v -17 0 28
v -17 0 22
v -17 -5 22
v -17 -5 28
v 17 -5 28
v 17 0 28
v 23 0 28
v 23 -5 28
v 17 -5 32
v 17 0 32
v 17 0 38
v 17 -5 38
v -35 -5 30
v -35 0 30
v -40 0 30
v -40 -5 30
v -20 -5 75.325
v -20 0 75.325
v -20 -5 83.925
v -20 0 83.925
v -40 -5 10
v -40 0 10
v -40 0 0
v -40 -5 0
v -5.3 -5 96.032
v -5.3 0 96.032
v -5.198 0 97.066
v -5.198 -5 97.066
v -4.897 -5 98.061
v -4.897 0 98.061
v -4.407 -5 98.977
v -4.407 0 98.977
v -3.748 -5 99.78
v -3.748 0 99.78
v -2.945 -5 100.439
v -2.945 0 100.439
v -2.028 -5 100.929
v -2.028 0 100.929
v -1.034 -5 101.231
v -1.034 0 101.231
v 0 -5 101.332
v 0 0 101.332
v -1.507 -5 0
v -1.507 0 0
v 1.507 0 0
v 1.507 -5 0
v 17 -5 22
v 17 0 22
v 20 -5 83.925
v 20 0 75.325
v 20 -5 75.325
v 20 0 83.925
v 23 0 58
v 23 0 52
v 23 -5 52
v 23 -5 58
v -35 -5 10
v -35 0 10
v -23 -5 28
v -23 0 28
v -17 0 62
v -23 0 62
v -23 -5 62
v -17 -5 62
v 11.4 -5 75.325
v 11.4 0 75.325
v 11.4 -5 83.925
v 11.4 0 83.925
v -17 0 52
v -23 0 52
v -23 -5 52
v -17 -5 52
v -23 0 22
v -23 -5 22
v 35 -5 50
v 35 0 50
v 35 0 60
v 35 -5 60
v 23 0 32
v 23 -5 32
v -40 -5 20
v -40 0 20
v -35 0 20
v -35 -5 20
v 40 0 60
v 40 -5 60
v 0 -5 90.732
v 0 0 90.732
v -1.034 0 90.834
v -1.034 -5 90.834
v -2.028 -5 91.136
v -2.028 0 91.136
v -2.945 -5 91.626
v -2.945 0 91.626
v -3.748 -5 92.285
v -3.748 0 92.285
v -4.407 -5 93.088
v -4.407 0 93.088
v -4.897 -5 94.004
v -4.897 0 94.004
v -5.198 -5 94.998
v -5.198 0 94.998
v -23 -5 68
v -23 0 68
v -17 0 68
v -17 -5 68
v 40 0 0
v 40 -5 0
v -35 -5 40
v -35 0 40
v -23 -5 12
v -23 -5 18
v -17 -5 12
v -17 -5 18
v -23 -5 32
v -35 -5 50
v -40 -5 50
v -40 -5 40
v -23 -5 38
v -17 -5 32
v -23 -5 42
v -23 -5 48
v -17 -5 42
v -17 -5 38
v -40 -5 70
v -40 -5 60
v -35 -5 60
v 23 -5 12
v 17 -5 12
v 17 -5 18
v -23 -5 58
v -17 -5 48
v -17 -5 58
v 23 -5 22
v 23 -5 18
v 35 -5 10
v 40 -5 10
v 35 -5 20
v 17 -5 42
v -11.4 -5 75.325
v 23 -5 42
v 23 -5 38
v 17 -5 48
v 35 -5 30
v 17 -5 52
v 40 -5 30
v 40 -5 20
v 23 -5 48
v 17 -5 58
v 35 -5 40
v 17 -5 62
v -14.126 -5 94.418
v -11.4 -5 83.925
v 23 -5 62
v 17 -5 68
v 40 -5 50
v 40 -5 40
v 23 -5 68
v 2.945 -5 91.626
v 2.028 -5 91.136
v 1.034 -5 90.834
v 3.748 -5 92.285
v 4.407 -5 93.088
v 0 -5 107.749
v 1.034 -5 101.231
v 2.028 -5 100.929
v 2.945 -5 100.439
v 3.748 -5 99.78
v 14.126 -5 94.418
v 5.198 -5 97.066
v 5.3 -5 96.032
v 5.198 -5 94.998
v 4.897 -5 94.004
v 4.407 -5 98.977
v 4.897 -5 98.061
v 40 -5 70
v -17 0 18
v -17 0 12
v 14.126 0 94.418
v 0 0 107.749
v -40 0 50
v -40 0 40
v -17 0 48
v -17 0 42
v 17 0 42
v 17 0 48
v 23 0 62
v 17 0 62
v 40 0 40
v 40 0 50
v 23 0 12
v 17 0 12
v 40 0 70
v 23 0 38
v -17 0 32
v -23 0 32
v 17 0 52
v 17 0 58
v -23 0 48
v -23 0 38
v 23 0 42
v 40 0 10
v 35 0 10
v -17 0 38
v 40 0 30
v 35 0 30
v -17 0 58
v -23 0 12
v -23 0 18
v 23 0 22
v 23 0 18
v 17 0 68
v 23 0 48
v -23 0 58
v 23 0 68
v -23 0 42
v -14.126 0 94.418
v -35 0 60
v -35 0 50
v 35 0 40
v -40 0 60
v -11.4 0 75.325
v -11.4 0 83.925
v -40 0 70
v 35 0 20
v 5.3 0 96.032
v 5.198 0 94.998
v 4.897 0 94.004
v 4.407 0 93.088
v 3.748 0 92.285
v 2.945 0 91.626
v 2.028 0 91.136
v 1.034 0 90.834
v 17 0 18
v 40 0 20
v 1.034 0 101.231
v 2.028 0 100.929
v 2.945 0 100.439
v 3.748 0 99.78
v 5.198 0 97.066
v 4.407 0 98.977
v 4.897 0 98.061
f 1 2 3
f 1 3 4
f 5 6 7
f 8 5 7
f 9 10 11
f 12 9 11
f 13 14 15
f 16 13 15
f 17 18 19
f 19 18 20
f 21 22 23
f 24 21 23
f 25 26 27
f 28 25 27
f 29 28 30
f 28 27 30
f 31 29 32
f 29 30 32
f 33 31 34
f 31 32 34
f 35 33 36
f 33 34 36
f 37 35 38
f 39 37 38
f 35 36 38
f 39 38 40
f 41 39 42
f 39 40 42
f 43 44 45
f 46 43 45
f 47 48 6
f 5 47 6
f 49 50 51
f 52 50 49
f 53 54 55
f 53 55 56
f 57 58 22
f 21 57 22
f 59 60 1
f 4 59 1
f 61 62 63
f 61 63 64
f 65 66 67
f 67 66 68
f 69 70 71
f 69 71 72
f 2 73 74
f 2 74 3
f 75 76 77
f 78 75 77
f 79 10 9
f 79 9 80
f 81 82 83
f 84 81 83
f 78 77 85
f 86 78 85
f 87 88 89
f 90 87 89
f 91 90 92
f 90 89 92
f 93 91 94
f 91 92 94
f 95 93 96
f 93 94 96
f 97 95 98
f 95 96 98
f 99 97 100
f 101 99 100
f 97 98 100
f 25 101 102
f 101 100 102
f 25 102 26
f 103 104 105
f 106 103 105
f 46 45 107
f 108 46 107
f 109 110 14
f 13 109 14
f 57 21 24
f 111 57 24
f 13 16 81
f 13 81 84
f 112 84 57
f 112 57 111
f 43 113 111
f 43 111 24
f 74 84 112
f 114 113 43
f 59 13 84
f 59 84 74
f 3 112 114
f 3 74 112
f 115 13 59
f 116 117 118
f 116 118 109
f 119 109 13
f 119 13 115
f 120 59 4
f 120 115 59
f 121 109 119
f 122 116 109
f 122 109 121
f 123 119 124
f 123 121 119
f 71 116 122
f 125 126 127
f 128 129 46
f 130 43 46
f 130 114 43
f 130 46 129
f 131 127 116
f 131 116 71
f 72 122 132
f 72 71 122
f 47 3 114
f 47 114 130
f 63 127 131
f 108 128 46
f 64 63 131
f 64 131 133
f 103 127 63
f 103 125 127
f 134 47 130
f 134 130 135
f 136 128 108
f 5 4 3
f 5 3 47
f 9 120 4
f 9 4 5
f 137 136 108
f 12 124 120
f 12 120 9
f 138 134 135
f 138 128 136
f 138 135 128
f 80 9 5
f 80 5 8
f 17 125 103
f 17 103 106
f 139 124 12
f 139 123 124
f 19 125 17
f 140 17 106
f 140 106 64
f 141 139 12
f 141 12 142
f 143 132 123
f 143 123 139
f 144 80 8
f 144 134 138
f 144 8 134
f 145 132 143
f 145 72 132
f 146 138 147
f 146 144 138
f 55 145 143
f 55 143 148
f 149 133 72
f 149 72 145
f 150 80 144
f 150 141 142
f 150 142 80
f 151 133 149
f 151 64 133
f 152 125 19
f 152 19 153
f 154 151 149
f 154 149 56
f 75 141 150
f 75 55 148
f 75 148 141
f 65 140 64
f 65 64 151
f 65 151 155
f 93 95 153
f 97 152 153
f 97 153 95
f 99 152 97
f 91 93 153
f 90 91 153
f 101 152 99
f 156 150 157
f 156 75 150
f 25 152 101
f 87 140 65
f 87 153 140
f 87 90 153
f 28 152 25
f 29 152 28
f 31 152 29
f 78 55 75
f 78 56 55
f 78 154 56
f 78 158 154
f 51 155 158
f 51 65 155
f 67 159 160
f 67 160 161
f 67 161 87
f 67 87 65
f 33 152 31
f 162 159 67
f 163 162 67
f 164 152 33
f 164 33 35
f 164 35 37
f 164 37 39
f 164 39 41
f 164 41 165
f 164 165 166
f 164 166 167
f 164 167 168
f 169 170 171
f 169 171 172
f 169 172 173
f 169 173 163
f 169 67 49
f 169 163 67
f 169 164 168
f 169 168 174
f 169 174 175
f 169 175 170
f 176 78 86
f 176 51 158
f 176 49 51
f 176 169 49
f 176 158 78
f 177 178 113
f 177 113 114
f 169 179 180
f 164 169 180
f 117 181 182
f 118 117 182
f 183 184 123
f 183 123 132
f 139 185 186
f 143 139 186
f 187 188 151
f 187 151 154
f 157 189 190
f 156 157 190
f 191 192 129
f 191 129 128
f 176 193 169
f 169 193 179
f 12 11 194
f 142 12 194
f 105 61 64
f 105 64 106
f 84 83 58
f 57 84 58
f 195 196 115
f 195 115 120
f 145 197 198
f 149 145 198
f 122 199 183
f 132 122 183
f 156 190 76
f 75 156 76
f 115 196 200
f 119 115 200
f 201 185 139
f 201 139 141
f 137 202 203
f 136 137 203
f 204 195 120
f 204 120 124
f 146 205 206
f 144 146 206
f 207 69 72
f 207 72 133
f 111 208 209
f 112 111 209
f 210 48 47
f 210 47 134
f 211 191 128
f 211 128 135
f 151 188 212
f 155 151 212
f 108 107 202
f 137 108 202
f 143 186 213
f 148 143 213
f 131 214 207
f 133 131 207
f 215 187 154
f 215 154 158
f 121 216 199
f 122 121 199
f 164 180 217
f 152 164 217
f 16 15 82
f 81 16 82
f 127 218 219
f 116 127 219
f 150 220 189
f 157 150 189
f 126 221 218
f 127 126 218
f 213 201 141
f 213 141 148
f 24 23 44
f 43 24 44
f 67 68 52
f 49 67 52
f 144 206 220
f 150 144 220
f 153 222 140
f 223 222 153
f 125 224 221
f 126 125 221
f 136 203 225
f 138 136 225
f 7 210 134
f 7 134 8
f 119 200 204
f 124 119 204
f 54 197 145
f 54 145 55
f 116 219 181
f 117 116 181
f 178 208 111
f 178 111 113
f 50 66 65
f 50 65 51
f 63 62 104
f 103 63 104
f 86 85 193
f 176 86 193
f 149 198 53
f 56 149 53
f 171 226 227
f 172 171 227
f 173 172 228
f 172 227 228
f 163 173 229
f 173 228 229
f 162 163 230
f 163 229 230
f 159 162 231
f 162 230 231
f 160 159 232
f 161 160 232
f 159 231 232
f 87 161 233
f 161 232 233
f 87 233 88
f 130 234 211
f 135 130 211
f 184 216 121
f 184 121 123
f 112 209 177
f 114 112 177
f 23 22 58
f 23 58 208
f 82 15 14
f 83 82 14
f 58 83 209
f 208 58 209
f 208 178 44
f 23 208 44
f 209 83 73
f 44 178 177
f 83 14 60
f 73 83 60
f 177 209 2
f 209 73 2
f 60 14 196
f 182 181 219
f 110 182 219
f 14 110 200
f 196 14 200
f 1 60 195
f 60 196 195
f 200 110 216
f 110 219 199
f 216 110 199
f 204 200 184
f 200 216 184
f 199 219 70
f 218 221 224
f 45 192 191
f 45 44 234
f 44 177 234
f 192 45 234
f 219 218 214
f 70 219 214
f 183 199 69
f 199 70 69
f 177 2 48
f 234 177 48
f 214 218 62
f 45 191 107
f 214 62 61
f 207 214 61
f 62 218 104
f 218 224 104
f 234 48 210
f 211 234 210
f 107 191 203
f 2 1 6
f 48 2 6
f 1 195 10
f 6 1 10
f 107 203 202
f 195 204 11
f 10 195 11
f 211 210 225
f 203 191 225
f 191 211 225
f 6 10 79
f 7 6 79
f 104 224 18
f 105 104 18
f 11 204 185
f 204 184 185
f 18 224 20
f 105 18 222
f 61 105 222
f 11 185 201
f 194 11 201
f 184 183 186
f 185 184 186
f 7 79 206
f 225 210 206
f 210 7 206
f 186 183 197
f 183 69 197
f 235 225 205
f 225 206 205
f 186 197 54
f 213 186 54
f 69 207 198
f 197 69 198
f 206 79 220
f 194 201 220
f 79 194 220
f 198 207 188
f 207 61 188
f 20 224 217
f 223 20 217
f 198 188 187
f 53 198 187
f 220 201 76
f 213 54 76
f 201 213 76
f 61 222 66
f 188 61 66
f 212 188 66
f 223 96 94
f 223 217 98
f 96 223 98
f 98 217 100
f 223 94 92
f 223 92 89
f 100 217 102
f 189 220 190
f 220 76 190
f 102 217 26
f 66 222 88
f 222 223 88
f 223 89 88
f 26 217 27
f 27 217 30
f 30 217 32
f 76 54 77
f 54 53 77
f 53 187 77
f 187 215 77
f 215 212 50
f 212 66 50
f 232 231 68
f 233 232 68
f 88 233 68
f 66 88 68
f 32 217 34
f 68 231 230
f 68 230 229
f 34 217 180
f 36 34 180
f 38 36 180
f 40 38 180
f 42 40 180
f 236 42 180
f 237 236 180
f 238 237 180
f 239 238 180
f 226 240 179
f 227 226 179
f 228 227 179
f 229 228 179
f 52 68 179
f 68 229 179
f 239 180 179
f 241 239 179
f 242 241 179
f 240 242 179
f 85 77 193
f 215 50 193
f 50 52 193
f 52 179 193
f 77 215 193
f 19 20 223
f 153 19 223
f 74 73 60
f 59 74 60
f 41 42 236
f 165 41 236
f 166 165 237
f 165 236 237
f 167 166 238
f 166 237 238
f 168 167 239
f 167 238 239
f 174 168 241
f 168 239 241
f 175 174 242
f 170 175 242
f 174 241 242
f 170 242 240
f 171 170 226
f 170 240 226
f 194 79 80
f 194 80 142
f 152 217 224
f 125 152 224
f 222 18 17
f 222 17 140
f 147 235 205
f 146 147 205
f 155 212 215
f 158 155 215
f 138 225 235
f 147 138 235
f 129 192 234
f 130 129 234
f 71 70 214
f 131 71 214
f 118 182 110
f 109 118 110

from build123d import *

# Parameters (mm, degrees)
F0_W     = 6
F0_H     = 6
F0_W_2   = 1.507329056
F0_H_2   = 5.8719553053
F0_W_3   = 8.6
F0_H_3   = 8.6
F1_DEPTH = 5


with BuildPart() as f1:
    # F0 (on Front) → F1 (new body)
    with BuildSketch(Plane.XZ):
        Polygon((-40, 10), (-40, 0), (-1.507329056, 0), (-1.507329056, 5.8719553053), (0, 5.8719553053), (0, 70), (-40, 70), (-40, 60), (-35, 60), (-35, 50), (-40, 50), (-40, 40), (-35, 40), (-35, 30), (-40, 30), (-40, 20), (-35, 20), (-35, 10), align=None)
        with Locations((-20, 15)):
            Rectangle(F0_W, F0_H, mode=Mode.SUBTRACT)
        with Locations((-20, 25)):
            Rectangle(F0_W, F0_H, mode=Mode.SUBTRACT)
        with Locations((-20, 35)):
            Rectangle(F0_W, F0_H, mode=Mode.SUBTRACT)
        with Locations((-20, 45)):
            Rectangle(F0_W, F0_H, mode=Mode.SUBTRACT)
        with Locations((-20, 55)):
            Rectangle(F0_W, F0_H, mode=Mode.SUBTRACT)
        with Locations((-20, 65)):
            Rectangle(F0_W, F0_H, mode=Mode.SUBTRACT)
        with Locations((-0.753664528, 2.9359776527)):
            Rectangle(F0_W_2, F0_H_2)
        with Locations((0.753664528, 2.9359776527)):
            Rectangle(F0_W_2, F0_H_2)
        Polygon((0, 70), (0, 5.8719553053), (1.507329056, 5.8719553053), (1.507329056, 0), (40, 0), (40, 10), (35, 10), (35, 20), (40, 20), (40, 30), (35, 30), (35, 40), (40, 40), (40, 50), (35, 50), (35, 60), (40, 60), (40, 70), align=None)
        with Locations((20, 15)):
            Rectangle(F0_W, F0_H, mode=Mode.SUBTRACT)
        with Locations((20, 25)):
            Rectangle(F0_W, F0_H, mode=Mode.SUBTRACT)
        with Locations((20, 35)):
            Rectangle(F0_W, F0_H, mode=Mode.SUBTRACT)
        with Locations((20, 45)):
            Rectangle(F0_W, F0_H, mode=Mode.SUBTRACT)
        with Locations((20, 55)):
            Rectangle(F0_W, F0_H, mode=Mode.SUBTRACT)
        with Locations((20, 65)):
            Rectangle(F0_W, F0_H, mode=Mode.SUBTRACT)
        Polygon((-40, 70), (0, 70), (40, 70), (14.1260570447, 94.4179981875), (0, 107.7491721764), (-14.1260570447, 94.4179981875), align=None)
        with Locations((-15.7, 79.6245860882)):
            Rectangle(F0_W_3, F0_H_3, mode=Mode.SUBTRACT)
        with Locations((15.7, 79.6245860882)):
            Rectangle(F0_W_3, F0_H_3, mode=Mode.SUBTRACT)
        with BuildLine():
            ThreePointArc((0, 101.3324183106), (3.7476659403, 99.7800842509), (5.3, 96.0324183106))
            ThreePointArc((5.3, 96.0324183106), (3.7476659403, 92.2847523704), (0, 90.7324183106))
            ThreePointArc((0, 90.7324183106), (-3.7476659403, 92.2847523704), (-5.3, 96.0324183106))
            ThreePointArc((-5.3, 96.0324183106), (-3.7476659403, 99.7800842509), (0, 101.3324183106))
        make_face(mode=Mode.SUBTRACT)
    extrude(amount=F1_DEPTH)


solid = f1.part
